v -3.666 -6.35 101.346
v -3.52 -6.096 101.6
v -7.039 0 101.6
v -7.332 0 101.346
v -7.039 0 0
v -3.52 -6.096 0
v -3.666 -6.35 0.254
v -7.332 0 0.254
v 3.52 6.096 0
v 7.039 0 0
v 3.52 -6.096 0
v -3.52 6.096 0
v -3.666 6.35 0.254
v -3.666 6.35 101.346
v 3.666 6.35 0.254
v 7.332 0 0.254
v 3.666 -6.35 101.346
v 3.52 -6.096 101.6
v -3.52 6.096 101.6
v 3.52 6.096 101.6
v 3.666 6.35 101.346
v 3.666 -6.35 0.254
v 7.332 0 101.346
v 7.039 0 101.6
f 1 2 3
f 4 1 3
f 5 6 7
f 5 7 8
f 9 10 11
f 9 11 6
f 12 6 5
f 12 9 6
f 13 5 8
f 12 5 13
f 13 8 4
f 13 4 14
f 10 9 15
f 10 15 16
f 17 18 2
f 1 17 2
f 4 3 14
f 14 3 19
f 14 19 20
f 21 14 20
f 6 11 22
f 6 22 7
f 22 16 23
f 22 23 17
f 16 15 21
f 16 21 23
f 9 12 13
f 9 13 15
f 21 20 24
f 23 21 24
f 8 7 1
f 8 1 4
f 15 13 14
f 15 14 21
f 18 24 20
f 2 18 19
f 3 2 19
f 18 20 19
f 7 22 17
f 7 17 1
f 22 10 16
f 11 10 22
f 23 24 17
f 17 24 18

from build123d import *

# Parameters (mm, degrees)
BOSS_EXTRUDE1_DEPTH = 101.6
CHAMFER1_SIZE       = 0.254


with BuildPart() as part:
    # Sketch1 → Boss-Extrude1 (new body)
    with BuildSketch(Plane(origin=(0, 0, 0), x_dir=(-1, 0, 0), z_dir=(0, 0, -1))):
        Polygon((3.666174209, 6.35), (-3.666174209, 6.35), (-7.332348419, 0), (-3.666174209, -6.35), (3.666174209, -6.35), (7.332348419, 0), align=None)
    extrude(amount=-BOSS_EXTRUDE1_DEPTH)

    # Chamfer1
    chamfer1_edges = [part.edges().sort_by_distance(p)[0] for p in [
        (5.499261314, 3.175, 101.6),
        (5.499261314, -3.175, 101.6),
        (0, -6.35, 101.6),
        (-5.499261314, -3.175, 101.6),
        (-5.499261314, 3.175, 101.6),
        (-5.499261314, -3.175, 0),
        (0, -6.35, 0),
        (5.499261314, -3.175, 0),
        (5.499261314, 3.175, 0),
        (0, 6.35, 0),
        (-5.499261314, 3.175, 0),
        (0, 6.35, 101.6),
    ]]
    chamfer(chamfer1_edges, length=CHAMFER1_SIZE)


solid = part.part
